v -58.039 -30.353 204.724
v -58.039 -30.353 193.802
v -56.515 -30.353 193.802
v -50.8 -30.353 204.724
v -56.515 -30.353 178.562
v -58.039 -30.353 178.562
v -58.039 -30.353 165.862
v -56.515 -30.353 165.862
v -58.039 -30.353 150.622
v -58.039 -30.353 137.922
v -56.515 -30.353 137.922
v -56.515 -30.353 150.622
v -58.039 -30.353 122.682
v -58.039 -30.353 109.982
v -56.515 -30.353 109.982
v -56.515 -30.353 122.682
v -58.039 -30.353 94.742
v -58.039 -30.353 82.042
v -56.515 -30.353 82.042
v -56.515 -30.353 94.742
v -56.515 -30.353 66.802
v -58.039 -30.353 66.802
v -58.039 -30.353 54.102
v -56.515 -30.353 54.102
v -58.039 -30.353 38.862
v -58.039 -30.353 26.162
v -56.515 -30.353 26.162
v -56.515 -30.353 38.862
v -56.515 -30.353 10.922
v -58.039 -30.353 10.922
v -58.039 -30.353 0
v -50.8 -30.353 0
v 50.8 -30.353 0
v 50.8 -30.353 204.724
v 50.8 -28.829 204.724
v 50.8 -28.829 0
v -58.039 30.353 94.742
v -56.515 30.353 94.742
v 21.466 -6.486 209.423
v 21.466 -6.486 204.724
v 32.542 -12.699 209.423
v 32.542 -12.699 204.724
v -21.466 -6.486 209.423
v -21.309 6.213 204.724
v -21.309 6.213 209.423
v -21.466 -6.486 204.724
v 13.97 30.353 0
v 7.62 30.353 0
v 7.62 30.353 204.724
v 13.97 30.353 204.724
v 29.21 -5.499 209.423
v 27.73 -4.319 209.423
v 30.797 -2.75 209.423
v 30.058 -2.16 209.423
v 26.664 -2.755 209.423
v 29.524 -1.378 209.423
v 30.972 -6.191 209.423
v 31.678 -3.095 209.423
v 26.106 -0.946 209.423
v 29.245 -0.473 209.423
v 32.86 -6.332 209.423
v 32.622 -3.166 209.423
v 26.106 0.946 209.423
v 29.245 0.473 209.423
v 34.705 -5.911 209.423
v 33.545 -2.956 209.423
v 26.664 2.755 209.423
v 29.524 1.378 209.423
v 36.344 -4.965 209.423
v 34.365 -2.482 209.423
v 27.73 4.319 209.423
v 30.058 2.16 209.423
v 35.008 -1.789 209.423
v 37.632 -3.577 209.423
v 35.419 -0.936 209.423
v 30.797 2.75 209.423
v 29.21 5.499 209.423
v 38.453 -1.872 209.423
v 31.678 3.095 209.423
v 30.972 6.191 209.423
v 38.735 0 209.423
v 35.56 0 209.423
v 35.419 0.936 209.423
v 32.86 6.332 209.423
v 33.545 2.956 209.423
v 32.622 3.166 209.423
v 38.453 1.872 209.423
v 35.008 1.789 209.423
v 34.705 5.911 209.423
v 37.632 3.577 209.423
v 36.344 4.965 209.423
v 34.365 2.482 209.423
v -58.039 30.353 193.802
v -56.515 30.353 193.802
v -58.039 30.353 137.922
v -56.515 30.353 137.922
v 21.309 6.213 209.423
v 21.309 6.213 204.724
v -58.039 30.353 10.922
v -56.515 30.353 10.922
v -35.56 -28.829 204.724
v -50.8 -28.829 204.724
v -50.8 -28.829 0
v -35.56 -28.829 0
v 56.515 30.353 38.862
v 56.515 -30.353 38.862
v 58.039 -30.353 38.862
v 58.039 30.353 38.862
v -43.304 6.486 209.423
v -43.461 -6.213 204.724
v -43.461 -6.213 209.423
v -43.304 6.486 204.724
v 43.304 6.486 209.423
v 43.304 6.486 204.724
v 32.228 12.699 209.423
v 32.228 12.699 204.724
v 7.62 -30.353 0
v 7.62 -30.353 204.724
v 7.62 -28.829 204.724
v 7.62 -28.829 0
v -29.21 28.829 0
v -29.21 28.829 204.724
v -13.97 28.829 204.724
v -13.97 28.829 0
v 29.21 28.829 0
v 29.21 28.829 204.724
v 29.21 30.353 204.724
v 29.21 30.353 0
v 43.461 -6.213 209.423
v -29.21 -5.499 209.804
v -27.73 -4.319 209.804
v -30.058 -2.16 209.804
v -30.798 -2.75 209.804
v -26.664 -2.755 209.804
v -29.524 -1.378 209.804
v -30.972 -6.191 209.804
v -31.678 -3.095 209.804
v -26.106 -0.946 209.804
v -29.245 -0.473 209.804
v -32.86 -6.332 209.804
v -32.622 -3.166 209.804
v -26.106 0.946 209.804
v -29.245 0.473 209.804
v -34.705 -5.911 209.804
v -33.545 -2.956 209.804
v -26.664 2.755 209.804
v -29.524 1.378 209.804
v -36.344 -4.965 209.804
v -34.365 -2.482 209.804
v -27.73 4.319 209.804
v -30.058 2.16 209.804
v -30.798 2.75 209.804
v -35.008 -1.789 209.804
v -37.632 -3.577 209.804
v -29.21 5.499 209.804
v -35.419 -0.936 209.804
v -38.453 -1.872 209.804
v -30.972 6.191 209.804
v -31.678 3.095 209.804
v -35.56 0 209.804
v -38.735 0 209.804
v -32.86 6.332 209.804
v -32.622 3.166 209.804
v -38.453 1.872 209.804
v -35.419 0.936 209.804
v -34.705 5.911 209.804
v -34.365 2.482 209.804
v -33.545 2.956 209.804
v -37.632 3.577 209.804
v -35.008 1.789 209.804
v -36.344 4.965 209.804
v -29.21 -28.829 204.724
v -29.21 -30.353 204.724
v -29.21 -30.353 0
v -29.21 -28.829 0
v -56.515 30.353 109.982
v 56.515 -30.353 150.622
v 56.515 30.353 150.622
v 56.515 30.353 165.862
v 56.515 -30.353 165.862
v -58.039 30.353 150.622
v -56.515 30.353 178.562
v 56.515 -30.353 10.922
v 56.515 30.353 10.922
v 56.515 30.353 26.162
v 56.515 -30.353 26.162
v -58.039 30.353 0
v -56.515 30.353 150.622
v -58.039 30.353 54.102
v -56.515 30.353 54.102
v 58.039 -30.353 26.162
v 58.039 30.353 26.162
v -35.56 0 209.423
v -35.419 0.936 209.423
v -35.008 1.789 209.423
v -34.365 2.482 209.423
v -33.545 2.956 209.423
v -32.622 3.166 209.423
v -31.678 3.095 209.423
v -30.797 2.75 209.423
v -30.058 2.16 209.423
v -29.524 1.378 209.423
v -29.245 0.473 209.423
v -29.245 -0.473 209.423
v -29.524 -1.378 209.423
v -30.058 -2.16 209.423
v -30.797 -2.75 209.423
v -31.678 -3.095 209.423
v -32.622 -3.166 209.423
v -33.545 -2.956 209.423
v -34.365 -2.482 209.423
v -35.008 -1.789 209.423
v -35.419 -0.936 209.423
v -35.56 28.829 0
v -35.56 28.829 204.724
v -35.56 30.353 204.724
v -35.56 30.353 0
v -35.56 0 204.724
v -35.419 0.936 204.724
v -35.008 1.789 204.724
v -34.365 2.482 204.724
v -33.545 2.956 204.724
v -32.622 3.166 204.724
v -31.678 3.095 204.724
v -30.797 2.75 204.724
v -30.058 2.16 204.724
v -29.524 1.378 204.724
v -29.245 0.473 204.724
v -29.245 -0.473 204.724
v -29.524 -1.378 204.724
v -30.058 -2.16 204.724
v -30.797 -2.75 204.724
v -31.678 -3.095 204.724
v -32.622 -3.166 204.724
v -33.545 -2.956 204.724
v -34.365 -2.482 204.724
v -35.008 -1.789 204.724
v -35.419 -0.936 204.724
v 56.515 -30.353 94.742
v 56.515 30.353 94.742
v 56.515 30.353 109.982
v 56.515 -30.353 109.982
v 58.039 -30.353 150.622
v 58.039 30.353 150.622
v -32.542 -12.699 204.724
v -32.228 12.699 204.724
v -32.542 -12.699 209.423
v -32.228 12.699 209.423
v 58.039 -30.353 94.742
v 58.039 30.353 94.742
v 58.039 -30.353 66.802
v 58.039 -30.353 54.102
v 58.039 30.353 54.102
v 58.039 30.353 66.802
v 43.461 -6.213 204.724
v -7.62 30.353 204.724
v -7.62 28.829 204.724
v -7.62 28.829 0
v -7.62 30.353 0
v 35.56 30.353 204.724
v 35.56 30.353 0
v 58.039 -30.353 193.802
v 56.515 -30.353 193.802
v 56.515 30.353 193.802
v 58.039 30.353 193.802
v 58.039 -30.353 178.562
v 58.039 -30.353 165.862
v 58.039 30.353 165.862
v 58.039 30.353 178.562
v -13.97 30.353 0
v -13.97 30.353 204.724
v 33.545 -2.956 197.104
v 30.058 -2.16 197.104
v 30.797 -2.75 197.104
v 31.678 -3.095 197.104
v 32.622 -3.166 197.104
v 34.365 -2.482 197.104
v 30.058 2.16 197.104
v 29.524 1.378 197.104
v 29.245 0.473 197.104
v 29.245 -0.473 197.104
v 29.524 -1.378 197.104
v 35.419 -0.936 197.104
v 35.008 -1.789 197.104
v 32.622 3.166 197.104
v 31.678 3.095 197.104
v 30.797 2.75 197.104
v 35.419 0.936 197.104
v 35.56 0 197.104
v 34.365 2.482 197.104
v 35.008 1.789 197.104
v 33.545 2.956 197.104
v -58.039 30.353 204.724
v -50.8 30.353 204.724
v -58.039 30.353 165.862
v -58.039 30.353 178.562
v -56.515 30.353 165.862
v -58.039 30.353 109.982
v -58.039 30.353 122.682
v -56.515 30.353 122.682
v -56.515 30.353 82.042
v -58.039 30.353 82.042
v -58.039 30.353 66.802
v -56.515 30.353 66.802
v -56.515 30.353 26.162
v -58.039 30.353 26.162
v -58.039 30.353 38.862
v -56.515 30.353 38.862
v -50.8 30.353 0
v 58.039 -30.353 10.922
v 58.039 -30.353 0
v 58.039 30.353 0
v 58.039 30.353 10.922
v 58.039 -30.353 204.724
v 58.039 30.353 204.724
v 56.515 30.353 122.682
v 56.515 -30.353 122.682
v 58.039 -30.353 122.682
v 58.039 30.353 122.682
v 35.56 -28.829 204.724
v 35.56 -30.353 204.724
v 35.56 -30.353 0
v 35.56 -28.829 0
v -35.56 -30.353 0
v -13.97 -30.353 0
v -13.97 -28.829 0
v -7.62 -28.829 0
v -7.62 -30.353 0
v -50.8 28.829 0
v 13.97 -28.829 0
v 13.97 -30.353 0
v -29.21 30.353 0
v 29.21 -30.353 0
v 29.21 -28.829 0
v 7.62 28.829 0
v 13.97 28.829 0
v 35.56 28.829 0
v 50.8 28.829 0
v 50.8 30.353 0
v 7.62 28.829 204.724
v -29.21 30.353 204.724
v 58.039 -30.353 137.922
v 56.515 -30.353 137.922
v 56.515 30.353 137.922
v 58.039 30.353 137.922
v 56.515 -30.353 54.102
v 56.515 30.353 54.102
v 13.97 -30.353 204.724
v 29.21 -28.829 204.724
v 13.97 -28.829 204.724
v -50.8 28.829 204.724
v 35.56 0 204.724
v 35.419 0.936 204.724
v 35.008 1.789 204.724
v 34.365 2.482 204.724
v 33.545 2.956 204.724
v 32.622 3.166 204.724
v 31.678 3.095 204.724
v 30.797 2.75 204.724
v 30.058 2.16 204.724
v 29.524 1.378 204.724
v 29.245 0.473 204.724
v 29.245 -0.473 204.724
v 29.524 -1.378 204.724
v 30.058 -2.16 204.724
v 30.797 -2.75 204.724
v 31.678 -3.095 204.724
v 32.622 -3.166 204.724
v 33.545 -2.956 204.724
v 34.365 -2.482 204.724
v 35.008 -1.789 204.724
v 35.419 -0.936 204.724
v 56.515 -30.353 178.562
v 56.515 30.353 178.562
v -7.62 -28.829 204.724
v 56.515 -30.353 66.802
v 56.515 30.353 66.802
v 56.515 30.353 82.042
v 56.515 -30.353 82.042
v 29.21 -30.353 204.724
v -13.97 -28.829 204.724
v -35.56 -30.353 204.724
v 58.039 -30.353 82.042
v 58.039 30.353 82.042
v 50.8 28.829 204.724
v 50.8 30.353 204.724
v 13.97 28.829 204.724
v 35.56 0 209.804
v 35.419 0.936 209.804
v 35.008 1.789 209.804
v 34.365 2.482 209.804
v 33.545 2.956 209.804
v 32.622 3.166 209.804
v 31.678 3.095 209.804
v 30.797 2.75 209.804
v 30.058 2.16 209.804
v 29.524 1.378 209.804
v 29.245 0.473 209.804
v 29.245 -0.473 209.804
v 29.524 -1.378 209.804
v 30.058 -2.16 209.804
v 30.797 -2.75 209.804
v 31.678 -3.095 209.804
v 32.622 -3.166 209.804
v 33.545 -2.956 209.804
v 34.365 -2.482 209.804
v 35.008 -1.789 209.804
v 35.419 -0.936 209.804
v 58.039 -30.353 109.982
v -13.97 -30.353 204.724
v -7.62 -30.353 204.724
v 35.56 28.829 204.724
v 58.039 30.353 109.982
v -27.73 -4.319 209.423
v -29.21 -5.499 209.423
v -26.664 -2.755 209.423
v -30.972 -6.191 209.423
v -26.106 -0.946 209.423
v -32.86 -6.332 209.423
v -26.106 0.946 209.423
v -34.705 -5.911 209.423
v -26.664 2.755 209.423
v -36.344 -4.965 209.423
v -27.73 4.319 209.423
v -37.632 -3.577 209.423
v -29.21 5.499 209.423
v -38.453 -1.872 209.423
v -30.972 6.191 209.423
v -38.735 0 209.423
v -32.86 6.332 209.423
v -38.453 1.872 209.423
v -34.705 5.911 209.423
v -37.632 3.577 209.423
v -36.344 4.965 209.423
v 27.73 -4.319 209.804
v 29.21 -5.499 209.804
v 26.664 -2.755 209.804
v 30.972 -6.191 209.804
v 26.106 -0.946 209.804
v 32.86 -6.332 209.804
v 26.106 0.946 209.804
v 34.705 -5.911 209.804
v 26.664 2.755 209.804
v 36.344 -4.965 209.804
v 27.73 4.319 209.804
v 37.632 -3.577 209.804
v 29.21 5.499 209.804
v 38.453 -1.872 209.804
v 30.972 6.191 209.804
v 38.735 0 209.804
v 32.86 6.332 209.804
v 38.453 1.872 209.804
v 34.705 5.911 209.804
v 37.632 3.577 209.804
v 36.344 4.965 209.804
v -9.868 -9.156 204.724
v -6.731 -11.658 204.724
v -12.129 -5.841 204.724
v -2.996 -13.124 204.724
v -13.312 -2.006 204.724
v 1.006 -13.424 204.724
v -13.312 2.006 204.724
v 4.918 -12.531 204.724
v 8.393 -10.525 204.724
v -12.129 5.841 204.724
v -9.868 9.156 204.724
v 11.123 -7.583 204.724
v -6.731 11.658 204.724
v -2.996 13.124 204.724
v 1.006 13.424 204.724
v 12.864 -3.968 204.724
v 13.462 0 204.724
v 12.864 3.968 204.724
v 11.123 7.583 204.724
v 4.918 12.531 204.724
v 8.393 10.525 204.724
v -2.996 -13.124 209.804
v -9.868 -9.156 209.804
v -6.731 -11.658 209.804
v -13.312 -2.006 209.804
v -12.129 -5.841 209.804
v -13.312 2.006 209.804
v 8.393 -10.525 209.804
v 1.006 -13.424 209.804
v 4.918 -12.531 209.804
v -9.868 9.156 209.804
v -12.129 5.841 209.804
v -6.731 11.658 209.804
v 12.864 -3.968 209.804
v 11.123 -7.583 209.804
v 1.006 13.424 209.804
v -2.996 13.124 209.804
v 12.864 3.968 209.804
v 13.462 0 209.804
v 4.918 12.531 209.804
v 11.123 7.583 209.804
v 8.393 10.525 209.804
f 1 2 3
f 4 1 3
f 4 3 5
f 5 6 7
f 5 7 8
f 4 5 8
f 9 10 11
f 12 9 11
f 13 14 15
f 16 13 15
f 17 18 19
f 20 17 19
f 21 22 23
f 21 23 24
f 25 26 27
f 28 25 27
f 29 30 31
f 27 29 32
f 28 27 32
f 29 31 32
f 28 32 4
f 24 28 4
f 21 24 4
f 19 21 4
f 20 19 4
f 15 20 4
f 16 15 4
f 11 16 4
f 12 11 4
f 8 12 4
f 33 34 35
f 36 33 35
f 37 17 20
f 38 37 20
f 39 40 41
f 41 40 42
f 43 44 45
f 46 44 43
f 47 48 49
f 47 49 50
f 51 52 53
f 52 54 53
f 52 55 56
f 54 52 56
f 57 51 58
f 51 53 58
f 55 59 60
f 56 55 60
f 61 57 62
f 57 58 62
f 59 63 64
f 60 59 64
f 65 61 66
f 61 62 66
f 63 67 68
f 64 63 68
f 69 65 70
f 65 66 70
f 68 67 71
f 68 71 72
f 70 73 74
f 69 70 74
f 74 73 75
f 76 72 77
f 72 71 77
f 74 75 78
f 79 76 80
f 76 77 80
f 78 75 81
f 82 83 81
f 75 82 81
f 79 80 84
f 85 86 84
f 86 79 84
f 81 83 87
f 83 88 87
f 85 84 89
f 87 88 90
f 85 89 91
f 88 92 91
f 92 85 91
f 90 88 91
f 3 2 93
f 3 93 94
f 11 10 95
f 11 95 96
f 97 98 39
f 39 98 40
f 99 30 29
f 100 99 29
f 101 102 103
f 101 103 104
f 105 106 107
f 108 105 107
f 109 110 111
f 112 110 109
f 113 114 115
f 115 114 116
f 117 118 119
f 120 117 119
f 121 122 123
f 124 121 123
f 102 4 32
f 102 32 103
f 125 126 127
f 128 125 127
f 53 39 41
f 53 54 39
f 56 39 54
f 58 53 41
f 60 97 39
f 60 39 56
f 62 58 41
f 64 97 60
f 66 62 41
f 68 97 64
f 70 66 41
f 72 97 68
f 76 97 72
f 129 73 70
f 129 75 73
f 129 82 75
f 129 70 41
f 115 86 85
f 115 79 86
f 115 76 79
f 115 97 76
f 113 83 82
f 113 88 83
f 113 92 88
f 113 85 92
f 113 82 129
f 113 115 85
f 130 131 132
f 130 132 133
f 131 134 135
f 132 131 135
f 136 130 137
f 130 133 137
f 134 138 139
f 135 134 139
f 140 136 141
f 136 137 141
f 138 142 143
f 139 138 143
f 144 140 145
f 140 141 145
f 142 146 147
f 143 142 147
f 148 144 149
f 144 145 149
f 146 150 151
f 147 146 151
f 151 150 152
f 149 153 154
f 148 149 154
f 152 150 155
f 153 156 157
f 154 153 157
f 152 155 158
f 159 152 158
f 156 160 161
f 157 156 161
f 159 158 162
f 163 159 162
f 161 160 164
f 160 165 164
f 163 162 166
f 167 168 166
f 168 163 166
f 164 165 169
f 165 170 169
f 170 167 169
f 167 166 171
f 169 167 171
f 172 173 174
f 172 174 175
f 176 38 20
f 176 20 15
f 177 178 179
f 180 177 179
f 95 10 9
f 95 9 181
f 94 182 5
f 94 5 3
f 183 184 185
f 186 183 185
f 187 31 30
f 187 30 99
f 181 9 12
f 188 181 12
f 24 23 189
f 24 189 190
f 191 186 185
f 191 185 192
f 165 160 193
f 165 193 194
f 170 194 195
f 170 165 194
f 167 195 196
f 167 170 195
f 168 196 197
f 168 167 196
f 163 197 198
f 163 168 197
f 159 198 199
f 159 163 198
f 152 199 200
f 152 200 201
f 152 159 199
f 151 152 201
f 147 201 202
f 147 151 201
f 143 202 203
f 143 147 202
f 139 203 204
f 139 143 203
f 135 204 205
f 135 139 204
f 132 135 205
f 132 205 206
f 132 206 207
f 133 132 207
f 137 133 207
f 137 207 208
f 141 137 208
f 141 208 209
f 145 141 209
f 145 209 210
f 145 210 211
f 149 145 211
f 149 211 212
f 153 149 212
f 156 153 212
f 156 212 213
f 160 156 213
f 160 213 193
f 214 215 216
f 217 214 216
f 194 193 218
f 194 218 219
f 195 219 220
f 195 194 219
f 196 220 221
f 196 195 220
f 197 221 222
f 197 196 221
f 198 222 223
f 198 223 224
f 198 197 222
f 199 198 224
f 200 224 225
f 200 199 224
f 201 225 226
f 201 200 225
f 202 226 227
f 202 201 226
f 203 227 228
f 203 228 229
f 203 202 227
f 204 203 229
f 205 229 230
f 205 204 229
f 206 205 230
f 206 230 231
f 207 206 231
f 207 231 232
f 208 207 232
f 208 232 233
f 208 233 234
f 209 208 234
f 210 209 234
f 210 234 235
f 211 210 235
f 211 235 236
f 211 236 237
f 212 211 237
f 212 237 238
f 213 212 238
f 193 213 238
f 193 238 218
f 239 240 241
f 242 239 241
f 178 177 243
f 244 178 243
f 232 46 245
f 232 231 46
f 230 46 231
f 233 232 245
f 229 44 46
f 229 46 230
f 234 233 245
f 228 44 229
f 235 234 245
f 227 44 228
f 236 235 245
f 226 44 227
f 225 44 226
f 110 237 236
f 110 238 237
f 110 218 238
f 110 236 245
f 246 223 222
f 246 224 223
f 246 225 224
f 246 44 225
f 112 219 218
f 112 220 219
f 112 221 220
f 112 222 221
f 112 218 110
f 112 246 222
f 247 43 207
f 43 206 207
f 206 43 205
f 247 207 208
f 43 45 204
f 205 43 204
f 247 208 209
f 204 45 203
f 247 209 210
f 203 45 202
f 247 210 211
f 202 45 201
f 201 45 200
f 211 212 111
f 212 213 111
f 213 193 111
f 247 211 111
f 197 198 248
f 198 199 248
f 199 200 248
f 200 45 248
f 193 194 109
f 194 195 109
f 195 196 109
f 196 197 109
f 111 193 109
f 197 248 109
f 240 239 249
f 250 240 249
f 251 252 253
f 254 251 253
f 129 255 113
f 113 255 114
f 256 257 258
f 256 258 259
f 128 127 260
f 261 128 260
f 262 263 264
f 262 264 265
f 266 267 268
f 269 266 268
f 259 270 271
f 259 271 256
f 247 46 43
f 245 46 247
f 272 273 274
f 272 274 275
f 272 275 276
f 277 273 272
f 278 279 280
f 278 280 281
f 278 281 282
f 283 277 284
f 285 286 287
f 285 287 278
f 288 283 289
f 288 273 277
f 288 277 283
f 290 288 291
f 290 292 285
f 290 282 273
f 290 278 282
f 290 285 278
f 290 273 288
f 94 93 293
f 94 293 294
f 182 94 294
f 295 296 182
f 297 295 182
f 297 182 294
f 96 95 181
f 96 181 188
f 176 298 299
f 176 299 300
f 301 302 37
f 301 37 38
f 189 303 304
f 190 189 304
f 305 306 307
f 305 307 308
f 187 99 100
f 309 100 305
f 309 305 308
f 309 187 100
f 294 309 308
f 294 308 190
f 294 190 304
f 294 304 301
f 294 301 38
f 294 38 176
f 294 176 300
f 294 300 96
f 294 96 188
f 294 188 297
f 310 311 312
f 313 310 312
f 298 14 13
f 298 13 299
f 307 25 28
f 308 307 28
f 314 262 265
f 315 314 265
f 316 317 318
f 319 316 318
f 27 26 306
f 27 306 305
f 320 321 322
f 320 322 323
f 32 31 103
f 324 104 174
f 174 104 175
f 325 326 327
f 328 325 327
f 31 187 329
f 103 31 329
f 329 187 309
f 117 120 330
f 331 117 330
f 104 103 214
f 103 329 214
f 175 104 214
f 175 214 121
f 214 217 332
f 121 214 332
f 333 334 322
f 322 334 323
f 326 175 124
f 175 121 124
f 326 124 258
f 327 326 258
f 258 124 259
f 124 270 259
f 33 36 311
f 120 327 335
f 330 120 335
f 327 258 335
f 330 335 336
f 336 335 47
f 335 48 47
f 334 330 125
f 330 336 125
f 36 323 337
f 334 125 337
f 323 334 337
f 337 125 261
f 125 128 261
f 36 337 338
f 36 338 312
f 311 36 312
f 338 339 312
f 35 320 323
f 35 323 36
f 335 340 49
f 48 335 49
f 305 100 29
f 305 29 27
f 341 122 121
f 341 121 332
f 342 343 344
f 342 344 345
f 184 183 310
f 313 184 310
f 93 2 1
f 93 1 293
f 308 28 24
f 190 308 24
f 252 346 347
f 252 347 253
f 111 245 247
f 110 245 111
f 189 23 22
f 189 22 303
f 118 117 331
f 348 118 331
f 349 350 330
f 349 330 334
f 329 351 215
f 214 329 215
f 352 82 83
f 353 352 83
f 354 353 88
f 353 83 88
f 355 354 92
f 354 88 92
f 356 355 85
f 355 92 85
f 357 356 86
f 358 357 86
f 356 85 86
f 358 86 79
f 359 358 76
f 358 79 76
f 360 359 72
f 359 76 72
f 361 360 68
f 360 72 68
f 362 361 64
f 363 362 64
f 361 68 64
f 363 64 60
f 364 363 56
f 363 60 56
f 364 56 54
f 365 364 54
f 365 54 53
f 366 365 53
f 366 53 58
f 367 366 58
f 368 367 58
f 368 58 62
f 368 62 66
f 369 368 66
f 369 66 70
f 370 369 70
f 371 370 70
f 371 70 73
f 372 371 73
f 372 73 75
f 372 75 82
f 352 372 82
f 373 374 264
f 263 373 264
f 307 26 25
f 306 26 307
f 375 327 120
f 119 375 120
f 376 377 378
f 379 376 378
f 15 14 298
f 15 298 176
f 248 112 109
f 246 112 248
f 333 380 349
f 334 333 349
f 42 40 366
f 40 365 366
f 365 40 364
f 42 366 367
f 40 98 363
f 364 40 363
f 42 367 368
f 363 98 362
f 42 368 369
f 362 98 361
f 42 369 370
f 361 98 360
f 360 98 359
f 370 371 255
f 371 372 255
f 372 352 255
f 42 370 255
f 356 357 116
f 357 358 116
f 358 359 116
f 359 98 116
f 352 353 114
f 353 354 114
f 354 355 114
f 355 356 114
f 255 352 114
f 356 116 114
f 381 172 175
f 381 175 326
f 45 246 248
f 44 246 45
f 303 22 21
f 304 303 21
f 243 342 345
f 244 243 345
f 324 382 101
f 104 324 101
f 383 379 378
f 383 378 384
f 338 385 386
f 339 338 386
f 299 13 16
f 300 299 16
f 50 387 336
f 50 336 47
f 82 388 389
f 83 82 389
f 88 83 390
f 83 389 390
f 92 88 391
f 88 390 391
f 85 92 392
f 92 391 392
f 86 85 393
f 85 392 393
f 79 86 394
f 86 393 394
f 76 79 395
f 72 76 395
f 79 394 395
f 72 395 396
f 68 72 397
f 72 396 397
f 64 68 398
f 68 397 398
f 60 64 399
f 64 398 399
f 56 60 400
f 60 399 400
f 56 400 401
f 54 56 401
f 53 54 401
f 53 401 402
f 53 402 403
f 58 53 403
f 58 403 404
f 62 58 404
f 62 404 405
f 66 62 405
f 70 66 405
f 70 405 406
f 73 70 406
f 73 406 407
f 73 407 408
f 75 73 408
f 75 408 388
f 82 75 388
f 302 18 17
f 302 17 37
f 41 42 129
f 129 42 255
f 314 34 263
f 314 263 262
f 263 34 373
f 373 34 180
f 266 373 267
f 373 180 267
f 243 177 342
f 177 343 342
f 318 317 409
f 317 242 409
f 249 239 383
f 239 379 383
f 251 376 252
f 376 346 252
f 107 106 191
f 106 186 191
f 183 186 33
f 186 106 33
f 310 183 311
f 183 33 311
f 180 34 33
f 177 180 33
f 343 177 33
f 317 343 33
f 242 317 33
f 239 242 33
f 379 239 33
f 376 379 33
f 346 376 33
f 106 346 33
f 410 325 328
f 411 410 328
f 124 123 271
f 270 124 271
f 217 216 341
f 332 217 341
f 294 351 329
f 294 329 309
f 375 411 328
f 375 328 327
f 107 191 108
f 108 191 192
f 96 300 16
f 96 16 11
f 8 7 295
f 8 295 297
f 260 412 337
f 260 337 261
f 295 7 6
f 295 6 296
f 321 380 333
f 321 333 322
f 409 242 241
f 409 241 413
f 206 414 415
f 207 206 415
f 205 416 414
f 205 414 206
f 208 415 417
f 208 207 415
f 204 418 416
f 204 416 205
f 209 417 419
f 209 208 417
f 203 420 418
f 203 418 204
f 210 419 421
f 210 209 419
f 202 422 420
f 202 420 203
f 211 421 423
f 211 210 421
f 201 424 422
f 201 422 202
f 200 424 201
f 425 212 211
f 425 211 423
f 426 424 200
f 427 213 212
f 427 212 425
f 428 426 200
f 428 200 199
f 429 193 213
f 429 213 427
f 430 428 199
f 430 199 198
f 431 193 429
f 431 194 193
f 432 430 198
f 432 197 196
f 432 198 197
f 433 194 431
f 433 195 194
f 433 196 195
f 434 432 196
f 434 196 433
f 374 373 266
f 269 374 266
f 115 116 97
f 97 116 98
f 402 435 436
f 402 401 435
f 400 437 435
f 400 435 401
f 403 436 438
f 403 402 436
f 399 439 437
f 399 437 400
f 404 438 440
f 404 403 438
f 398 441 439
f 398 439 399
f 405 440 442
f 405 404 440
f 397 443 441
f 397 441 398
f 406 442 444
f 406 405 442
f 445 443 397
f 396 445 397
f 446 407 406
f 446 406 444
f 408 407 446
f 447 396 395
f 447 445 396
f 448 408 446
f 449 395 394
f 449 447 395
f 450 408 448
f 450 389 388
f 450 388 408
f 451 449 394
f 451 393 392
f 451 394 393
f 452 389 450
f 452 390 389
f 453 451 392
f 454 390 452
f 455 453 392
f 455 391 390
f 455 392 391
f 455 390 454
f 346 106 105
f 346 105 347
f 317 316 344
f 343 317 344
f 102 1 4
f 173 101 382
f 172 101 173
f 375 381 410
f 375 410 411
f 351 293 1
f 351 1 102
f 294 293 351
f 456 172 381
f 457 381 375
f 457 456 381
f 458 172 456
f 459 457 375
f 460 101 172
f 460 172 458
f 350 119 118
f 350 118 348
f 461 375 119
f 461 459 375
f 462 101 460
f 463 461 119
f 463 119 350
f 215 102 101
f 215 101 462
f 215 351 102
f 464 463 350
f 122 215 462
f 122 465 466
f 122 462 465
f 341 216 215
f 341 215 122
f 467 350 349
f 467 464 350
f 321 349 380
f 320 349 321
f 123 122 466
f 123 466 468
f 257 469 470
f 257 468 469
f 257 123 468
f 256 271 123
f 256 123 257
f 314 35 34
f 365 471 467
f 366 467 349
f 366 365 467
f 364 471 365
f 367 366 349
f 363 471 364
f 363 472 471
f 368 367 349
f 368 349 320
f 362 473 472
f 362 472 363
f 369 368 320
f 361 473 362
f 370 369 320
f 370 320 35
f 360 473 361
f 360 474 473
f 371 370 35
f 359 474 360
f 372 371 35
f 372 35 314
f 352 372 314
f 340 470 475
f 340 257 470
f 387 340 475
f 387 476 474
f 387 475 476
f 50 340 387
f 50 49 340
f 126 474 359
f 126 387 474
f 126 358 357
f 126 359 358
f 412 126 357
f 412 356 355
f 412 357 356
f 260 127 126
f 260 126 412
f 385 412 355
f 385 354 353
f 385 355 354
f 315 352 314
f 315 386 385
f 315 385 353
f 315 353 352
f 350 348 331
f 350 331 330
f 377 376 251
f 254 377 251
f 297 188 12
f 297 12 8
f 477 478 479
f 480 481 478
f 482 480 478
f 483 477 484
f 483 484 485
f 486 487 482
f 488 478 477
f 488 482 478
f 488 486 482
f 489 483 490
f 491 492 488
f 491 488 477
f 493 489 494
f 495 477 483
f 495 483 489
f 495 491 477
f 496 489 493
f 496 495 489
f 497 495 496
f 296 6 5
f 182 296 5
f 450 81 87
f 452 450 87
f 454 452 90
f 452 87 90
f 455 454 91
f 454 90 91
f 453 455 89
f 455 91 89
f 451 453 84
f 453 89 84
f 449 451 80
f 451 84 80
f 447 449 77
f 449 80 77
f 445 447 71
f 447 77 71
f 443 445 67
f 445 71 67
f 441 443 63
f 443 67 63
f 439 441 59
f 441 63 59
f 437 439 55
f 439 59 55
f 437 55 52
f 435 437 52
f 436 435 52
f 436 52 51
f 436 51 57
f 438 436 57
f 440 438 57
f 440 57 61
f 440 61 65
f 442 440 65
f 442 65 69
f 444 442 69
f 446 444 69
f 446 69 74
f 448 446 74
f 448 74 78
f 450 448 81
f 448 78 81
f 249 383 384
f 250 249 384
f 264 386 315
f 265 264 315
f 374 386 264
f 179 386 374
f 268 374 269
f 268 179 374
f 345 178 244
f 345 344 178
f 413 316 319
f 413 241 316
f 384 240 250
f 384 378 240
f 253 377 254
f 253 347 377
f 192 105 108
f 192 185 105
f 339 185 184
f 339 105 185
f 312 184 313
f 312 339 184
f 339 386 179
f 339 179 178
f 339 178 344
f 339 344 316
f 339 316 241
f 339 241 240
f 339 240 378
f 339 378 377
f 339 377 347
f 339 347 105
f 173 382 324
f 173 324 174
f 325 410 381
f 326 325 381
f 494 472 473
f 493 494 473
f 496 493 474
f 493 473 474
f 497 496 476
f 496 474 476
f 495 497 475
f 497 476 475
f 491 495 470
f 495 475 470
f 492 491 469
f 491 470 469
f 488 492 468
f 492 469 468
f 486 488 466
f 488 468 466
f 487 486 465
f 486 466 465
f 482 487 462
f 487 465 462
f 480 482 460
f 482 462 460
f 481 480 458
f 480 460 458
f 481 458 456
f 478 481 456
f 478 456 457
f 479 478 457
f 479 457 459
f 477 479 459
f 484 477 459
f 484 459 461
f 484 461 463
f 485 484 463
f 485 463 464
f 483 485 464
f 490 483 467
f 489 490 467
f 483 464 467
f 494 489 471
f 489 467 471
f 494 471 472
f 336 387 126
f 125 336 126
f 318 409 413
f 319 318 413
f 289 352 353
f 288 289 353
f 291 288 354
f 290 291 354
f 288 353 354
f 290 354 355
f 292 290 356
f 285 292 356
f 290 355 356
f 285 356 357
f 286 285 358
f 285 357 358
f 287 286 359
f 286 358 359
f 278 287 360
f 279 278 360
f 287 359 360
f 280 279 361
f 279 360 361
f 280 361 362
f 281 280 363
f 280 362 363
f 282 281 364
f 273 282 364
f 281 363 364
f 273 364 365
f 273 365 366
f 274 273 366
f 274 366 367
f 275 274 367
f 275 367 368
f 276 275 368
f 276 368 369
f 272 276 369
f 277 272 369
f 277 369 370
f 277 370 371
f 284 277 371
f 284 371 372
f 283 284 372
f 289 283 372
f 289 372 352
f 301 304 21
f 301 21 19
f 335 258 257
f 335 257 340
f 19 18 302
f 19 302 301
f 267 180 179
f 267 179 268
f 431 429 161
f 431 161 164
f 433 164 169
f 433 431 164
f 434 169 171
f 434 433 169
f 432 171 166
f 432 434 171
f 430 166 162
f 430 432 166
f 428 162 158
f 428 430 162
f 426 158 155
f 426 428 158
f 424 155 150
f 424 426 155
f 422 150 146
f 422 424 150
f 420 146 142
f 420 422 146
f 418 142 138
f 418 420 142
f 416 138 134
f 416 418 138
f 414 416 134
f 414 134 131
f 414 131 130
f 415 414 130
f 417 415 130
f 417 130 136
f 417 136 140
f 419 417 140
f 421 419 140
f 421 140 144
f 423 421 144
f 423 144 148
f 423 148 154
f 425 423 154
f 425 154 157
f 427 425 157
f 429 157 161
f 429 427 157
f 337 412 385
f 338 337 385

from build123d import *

# Parameters (mm, degrees)
F0_W      = 116.078
F0_H      = 60.706
F1_DEPTH  = 25.4
F1_FACE_W = 116.078
F1_FACE_H = 60.706
F2_DEPTH  = 179.324
F3_W      = 15.24
F3_H      = 1.524
F4_DEPTH  = 204.725
F5_W      = 1.524
F5_H      = 15.24
F6_DEPTH  = 60.707
F7_R      = 13.462
F8_DEPTH  = 5.08
F10_DEPTH = 4.699
F11_R     = 6.35
F12_DEPTH = 0.381
F13_R     = 3.175
F14_DEPTH = 12.7


with BuildPart() as f1:
    # F0 (on Top) → F1 (new body)
    with BuildSketch(Plane.XY):
        Rectangle(F0_W, F0_H)
    extrude(amount=F1_DEPTH)

    # F1_face (on face) → F2 (join)
    with BuildSketch(Plane.XY.offset(25.4)):
        Rectangle(F1_FACE_W, F1_FACE_H)
    extrude(amount=F2_DEPTH)

    # F3 (on face) → F4 (cut, through all)
    with BuildSketch(Plane.XY.offset(204.724)):
        with Locations((-43.18, 29.591)):
            Rectangle(F3_W, F3_H)
        with Locations((-21.59, 29.591)):
            Rectangle(F3_W, F3_H)
        with Locations((0, 29.591)):
            Rectangle(F3_W, F3_H)
        with Locations((21.59, 29.591)):
            Rectangle(F3_W, F3_H)
        with Locations((43.18, 29.591)):
            Rectangle(F3_W, F3_H)
        with Locations((43.18, -29.591)):
            Rectangle(F3_W, F3_H)
        with Locations((21.59, -29.591)):
            Rectangle(F3_W, F3_H)
        with Locations((0, -29.591)):
            Rectangle(F3_W, F3_H)
        with Locations((-21.59, -29.591)):
            Rectangle(F3_W, F3_H)
        with Locations((-43.18, -29.591)):
            Rectangle(F3_W, F3_H)
    extrude(amount=-F4_DEPTH, mode=Mode.SUBTRACT)

    # F5 (on face) → F6 (cut, through all)
    with BuildSketch(Plane.XZ.offset(30.353)):
        with Locations((-57.277, 102.362)):
            Rectangle(F5_W, F5_H)
        with Locations((-57.277, 74.422)):
            Rectangle(F5_W, F5_H)
        with Locations((-57.277, 46.482)):
            Rectangle(F5_W, F5_H)
        with Locations((-57.277, 18.542)):
            Rectangle(F5_W, F5_H)
        with Locations((-57.277, 130.302)):
            Rectangle(F5_W, F5_H)
        with Locations((-57.277, 158.242)):
            Rectangle(F5_W, F5_H)
        with Locations((-57.277, 186.182)):
            Rectangle(F5_W, F5_H)
        with Locations((57.277, 102.362)):
            Rectangle(F5_W, F5_H)
        with Locations((57.277, 74.422)):
            Rectangle(F5_W, F5_H)
        with Locations((57.277, 130.302)):
            Rectangle(F5_W, F5_H)
        with Locations((57.277, 46.482)):
            Rectangle(F5_W, F5_H)
        with Locations((57.277, 186.182)):
            Rectangle(F5_W, F5_H)
        with Locations((57.277, 18.542)):
            Rectangle(F5_W, F5_H)
        with Locations((57.277, 158.242)):
            Rectangle(F5_W, F5_H)
    extrude(amount=-F6_DEPTH, mode=Mode.SUBTRACT)

    # F7 (on face) → F8 (join)
    with BuildSketch(Plane.XY.offset(204.724)):
        Circle(F7_R)
    extrude(amount=F8_DEPTH)


with BuildPart() as f10:
    # F9 (on face) → F10 (new body)
    with BuildSketch(Plane.XY.offset(204.724)):
        Polygon((32.542071, -12.699029), (43.461217, -6.213487), (43.304146, 6.485542), (32.227929, 12.699029), (21.308783, 6.213487), (21.465854, -6.485542), align=None)
    extrude(amount=F10_DEPTH)


with BuildPart() as f12:
    # F11 (on face) → F12 (new body)
    with BuildSketch(Plane.XY.offset(209.423)):
        with Locations((32.385, 0)):
            Circle(F11_R)
    extrude(amount=F12_DEPTH)


with BuildPart() as f14_tool:
    # F13 (on face) → F14 (new body)
    with BuildSketch(Plane.XY.offset(209.804)):
        with Locations((32.385, 0)):
            Circle(F13_R)
    extrude(amount=-F14_DEPTH)


with BuildPart() as f1_1:
    add(f1.part)

    # F14: cut by f14_tool
    add(f14_tool.part, mode=Mode.SUBTRACT)


with BuildPart() as f10_1:
    add(f10.part)

    # F14: cut by f14_tool
    add(f14_tool.part, mode=Mode.SUBTRACT)


with BuildPart() as f12_1:
    add(f12.part)

    # F14: cut by f14_tool
    add(f14_tool.part, mode=Mode.SUBTRACT)


with BuildPart() as f15_1:
    # F15: instance of F12
    add(f12_1.part.mirror(Plane.YZ))


with BuildPart() as f15_2:
    # F15: instance of F10
    add(f10_1.part.mirror(Plane.YZ))


solid = Compound([f1_1.part, f10_1.part, f12_1.part, f15_1.part, f15_2.part])
